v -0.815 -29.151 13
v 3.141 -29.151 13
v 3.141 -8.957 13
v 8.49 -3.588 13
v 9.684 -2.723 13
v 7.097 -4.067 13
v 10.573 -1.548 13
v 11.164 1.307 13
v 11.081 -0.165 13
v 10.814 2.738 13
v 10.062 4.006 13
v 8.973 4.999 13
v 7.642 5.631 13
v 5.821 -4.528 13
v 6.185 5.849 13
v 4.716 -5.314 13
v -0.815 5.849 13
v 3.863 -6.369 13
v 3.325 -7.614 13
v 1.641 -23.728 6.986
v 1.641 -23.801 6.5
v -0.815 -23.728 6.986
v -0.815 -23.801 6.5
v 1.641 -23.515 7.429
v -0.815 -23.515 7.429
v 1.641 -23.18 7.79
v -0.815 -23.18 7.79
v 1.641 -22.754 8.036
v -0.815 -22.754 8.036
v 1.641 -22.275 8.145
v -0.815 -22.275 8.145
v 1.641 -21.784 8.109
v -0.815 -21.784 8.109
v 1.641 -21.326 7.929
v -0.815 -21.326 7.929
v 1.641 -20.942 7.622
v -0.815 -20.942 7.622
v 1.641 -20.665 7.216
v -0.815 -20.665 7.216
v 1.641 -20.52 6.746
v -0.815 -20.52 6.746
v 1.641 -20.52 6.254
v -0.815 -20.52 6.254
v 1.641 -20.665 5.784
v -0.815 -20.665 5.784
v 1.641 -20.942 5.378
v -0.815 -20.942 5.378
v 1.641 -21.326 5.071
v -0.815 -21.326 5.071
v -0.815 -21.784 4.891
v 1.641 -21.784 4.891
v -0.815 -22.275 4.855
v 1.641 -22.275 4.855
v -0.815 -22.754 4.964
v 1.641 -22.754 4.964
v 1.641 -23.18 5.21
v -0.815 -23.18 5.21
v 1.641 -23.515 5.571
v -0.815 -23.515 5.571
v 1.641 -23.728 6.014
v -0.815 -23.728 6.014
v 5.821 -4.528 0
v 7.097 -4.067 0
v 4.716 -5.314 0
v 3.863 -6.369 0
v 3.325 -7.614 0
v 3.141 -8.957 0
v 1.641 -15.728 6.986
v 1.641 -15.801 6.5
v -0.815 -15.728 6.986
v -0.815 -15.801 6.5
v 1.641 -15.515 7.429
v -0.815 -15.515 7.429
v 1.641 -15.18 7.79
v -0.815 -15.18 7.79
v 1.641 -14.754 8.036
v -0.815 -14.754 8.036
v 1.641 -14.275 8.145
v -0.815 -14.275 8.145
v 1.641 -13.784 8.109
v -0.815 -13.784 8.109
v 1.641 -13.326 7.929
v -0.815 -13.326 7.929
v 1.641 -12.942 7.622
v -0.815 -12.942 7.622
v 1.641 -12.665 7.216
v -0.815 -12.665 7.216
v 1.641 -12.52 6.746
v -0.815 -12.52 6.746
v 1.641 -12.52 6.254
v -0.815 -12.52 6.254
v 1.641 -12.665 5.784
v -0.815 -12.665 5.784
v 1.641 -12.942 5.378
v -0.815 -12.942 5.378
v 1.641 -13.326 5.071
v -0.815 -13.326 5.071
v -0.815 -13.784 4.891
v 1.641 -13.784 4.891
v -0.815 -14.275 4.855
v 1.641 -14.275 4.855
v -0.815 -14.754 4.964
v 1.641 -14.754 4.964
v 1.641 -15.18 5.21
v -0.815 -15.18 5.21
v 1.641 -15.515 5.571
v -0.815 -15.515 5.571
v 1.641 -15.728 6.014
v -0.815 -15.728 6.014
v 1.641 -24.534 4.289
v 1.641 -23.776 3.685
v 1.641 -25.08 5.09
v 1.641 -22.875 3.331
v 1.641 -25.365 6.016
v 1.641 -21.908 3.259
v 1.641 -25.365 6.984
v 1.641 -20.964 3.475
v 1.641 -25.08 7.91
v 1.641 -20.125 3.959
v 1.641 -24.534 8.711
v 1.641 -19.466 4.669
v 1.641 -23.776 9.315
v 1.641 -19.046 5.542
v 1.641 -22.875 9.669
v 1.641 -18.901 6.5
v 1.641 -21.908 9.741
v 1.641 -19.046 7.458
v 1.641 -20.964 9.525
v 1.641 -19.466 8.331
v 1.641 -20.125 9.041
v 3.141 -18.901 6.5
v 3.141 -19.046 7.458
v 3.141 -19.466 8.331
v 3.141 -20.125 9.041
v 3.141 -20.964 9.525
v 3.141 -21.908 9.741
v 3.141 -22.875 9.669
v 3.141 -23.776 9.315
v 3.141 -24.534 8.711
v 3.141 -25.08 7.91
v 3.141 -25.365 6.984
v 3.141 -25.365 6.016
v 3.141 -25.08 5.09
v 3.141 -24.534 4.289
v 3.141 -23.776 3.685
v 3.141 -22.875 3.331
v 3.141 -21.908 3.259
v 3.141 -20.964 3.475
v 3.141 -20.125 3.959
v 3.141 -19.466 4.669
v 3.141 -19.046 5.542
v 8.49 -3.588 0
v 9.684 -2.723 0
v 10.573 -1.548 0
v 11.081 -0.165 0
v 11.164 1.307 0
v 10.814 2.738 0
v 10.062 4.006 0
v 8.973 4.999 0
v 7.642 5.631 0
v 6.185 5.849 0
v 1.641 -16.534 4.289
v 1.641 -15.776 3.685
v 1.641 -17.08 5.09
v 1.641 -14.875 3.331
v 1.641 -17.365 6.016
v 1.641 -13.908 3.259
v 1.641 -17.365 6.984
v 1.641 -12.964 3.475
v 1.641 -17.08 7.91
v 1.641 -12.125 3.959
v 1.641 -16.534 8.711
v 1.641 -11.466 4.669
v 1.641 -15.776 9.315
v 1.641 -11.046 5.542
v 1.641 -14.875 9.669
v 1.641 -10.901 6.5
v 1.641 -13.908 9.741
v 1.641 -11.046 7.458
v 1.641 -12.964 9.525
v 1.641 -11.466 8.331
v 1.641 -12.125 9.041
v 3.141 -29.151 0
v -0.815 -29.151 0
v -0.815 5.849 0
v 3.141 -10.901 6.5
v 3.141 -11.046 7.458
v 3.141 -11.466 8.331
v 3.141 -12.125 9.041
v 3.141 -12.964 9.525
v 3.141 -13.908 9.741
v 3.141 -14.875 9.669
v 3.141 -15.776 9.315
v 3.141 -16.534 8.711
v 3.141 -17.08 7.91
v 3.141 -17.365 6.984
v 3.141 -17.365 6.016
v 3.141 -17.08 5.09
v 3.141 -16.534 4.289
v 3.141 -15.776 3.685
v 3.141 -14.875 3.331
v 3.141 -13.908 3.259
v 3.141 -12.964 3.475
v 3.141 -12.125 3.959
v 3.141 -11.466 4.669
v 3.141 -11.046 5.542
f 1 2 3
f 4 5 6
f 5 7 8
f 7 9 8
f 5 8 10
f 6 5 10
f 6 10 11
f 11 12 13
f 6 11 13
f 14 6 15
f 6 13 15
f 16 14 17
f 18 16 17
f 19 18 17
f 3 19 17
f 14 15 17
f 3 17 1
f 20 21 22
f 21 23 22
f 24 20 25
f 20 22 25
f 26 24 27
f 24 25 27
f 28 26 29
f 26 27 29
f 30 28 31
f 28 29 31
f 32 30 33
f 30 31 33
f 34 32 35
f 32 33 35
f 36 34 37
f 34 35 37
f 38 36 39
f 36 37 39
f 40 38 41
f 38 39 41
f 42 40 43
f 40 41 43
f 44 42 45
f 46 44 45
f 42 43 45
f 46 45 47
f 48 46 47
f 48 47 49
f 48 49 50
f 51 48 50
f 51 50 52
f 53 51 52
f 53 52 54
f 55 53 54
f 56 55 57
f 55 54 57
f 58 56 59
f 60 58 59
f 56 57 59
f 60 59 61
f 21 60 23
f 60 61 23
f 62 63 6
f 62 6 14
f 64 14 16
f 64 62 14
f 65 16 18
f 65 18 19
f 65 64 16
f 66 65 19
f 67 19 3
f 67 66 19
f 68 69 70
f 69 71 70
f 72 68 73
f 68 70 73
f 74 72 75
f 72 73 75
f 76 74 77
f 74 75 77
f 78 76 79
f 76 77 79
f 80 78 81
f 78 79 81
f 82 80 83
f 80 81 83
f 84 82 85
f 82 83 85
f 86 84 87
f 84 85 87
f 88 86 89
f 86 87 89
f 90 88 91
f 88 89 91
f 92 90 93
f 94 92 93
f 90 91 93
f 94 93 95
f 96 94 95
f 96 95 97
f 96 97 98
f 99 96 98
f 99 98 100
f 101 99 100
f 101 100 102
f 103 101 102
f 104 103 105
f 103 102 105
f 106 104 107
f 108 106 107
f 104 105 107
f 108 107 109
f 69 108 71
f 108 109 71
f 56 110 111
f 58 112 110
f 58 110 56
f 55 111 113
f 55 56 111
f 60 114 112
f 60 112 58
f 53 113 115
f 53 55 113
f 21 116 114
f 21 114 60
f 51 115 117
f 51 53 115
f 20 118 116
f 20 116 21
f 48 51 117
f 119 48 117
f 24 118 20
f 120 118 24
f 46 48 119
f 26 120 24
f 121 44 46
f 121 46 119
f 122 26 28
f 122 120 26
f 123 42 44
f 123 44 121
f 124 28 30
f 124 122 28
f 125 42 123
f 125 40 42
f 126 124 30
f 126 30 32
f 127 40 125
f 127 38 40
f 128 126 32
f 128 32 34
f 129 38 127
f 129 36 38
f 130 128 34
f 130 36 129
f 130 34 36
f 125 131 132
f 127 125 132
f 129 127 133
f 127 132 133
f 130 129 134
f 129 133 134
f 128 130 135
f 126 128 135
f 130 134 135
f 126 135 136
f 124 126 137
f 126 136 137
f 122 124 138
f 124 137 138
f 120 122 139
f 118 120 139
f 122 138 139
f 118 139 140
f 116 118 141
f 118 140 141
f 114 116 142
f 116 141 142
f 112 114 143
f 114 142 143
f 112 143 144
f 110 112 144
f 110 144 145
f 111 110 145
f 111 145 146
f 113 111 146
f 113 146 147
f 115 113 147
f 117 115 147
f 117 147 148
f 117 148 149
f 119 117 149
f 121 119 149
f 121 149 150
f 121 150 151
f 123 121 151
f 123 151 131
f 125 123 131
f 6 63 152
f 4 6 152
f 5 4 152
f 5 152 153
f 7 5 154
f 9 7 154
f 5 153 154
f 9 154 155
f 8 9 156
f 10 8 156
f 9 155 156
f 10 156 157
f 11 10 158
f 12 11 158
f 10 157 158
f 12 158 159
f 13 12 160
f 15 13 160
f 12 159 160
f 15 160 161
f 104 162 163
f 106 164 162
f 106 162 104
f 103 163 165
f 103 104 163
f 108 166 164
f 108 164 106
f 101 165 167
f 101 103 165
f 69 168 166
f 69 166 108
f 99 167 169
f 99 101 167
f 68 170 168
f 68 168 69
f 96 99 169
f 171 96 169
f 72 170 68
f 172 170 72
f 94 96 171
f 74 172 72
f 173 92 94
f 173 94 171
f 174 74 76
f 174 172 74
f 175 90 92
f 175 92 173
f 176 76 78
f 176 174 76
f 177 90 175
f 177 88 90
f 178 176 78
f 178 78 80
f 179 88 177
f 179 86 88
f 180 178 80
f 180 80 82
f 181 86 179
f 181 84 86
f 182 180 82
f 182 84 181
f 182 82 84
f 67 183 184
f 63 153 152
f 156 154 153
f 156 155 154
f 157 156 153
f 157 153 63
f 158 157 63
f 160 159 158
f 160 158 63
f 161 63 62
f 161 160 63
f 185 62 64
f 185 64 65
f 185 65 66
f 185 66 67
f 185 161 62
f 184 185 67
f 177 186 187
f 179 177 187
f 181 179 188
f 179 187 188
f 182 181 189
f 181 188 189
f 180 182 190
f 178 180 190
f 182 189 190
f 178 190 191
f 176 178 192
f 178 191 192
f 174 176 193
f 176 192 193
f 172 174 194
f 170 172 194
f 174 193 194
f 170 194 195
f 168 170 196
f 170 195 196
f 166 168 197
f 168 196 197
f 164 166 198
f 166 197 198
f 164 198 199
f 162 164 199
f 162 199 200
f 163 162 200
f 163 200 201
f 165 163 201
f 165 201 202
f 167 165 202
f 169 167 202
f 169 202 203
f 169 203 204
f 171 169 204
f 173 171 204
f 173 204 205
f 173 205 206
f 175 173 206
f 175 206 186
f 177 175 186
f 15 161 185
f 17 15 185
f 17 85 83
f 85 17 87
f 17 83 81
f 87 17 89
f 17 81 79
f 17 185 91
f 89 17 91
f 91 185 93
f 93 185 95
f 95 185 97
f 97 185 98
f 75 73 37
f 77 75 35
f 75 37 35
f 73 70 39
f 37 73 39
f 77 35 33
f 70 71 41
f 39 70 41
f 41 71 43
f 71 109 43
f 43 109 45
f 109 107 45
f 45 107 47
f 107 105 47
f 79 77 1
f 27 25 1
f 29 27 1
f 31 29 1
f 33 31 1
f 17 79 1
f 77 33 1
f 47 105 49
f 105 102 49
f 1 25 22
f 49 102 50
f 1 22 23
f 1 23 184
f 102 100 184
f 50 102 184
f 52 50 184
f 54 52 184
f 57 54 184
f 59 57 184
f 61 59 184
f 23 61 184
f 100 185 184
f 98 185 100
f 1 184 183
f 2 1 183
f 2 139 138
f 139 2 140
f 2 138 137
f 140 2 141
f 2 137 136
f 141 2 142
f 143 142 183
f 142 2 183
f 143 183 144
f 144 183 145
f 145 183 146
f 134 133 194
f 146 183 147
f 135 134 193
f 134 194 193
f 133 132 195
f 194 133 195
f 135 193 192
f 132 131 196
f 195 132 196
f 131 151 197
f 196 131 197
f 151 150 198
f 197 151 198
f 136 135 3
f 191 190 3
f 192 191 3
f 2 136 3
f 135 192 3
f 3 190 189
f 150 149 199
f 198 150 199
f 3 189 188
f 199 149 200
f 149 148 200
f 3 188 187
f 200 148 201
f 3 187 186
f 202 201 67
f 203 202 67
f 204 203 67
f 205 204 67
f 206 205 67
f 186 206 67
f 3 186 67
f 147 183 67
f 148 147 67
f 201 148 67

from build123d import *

# Parameters (mm, degrees)
F1_DEPTH       = 13
F2_T1_DEPTH    = 13
F4_D           = 3.3
F4_CBORE_D     = 6.5
F4_CBORE_DEPTH = 1.5


# Not quite as in the source:
# - a fillet or chamfer that OpenCascade refuses, or shapes differently, is made with other operations: its cross-section is extruded or revolved along the edge and cut away or added


with BuildPart() as f1:
    # F0 (on Top) → F1 (new body)
    with BuildSketch(Plane.XY):
        with BuildLine():
            Line((6.184642151, 5.8486273885), (-0.815357849, 5.8486273885))
            Line((-0.815357849, 5.8486273885), (-0.815357849, -29.1513726115))
            Line((-0.815357849, -29.1513726115), (3.1407309243, -29.1513726115))
            Line((3.1407309243, -29.1513726115), (3.1407309243, -4.0674617201))
            Line((3.1407309243, -4.0674617201), (7.0968196975, -4.0674617201))
            ThreePointArc((7.0968196975, -4.0674617201), (11.1636202361, 1.3066418299), (6.184642151, 5.8486273885))
        make_face()
    extrude(amount=F1_DEPTH)

    # F2: fillet of radius 5 on 1 edges, made by hand

    # F2_s2 → F2_t1 (join)
    with BuildSketch(Plane.XY):
        with BuildLine():
            ThreePointArc((7.0968196975, -4.0674617201), (4.2536011262, -5.8124001647), (3.1407309243, -8.9572724885))
            Line((3.1407309243, -8.9572724885), (3.1407309243, -4.0674617201))
            Line((3.1407309243, -4.0674617201), (7.0968196975, -4.0674617201))
        make_face()
    extrude(amount=F2_T1_DEPTH)

    # F4 (through all)
    with Locations(Plane.YZ.offset(3.1407309243)):
        with Locations((-22.1513726115, 6.5), (-14.1513726115, 6.5)):
            CounterBoreHole(F4_D / 2, F4_CBORE_D / 2, F4_CBORE_DEPTH)


solid = f1.part
